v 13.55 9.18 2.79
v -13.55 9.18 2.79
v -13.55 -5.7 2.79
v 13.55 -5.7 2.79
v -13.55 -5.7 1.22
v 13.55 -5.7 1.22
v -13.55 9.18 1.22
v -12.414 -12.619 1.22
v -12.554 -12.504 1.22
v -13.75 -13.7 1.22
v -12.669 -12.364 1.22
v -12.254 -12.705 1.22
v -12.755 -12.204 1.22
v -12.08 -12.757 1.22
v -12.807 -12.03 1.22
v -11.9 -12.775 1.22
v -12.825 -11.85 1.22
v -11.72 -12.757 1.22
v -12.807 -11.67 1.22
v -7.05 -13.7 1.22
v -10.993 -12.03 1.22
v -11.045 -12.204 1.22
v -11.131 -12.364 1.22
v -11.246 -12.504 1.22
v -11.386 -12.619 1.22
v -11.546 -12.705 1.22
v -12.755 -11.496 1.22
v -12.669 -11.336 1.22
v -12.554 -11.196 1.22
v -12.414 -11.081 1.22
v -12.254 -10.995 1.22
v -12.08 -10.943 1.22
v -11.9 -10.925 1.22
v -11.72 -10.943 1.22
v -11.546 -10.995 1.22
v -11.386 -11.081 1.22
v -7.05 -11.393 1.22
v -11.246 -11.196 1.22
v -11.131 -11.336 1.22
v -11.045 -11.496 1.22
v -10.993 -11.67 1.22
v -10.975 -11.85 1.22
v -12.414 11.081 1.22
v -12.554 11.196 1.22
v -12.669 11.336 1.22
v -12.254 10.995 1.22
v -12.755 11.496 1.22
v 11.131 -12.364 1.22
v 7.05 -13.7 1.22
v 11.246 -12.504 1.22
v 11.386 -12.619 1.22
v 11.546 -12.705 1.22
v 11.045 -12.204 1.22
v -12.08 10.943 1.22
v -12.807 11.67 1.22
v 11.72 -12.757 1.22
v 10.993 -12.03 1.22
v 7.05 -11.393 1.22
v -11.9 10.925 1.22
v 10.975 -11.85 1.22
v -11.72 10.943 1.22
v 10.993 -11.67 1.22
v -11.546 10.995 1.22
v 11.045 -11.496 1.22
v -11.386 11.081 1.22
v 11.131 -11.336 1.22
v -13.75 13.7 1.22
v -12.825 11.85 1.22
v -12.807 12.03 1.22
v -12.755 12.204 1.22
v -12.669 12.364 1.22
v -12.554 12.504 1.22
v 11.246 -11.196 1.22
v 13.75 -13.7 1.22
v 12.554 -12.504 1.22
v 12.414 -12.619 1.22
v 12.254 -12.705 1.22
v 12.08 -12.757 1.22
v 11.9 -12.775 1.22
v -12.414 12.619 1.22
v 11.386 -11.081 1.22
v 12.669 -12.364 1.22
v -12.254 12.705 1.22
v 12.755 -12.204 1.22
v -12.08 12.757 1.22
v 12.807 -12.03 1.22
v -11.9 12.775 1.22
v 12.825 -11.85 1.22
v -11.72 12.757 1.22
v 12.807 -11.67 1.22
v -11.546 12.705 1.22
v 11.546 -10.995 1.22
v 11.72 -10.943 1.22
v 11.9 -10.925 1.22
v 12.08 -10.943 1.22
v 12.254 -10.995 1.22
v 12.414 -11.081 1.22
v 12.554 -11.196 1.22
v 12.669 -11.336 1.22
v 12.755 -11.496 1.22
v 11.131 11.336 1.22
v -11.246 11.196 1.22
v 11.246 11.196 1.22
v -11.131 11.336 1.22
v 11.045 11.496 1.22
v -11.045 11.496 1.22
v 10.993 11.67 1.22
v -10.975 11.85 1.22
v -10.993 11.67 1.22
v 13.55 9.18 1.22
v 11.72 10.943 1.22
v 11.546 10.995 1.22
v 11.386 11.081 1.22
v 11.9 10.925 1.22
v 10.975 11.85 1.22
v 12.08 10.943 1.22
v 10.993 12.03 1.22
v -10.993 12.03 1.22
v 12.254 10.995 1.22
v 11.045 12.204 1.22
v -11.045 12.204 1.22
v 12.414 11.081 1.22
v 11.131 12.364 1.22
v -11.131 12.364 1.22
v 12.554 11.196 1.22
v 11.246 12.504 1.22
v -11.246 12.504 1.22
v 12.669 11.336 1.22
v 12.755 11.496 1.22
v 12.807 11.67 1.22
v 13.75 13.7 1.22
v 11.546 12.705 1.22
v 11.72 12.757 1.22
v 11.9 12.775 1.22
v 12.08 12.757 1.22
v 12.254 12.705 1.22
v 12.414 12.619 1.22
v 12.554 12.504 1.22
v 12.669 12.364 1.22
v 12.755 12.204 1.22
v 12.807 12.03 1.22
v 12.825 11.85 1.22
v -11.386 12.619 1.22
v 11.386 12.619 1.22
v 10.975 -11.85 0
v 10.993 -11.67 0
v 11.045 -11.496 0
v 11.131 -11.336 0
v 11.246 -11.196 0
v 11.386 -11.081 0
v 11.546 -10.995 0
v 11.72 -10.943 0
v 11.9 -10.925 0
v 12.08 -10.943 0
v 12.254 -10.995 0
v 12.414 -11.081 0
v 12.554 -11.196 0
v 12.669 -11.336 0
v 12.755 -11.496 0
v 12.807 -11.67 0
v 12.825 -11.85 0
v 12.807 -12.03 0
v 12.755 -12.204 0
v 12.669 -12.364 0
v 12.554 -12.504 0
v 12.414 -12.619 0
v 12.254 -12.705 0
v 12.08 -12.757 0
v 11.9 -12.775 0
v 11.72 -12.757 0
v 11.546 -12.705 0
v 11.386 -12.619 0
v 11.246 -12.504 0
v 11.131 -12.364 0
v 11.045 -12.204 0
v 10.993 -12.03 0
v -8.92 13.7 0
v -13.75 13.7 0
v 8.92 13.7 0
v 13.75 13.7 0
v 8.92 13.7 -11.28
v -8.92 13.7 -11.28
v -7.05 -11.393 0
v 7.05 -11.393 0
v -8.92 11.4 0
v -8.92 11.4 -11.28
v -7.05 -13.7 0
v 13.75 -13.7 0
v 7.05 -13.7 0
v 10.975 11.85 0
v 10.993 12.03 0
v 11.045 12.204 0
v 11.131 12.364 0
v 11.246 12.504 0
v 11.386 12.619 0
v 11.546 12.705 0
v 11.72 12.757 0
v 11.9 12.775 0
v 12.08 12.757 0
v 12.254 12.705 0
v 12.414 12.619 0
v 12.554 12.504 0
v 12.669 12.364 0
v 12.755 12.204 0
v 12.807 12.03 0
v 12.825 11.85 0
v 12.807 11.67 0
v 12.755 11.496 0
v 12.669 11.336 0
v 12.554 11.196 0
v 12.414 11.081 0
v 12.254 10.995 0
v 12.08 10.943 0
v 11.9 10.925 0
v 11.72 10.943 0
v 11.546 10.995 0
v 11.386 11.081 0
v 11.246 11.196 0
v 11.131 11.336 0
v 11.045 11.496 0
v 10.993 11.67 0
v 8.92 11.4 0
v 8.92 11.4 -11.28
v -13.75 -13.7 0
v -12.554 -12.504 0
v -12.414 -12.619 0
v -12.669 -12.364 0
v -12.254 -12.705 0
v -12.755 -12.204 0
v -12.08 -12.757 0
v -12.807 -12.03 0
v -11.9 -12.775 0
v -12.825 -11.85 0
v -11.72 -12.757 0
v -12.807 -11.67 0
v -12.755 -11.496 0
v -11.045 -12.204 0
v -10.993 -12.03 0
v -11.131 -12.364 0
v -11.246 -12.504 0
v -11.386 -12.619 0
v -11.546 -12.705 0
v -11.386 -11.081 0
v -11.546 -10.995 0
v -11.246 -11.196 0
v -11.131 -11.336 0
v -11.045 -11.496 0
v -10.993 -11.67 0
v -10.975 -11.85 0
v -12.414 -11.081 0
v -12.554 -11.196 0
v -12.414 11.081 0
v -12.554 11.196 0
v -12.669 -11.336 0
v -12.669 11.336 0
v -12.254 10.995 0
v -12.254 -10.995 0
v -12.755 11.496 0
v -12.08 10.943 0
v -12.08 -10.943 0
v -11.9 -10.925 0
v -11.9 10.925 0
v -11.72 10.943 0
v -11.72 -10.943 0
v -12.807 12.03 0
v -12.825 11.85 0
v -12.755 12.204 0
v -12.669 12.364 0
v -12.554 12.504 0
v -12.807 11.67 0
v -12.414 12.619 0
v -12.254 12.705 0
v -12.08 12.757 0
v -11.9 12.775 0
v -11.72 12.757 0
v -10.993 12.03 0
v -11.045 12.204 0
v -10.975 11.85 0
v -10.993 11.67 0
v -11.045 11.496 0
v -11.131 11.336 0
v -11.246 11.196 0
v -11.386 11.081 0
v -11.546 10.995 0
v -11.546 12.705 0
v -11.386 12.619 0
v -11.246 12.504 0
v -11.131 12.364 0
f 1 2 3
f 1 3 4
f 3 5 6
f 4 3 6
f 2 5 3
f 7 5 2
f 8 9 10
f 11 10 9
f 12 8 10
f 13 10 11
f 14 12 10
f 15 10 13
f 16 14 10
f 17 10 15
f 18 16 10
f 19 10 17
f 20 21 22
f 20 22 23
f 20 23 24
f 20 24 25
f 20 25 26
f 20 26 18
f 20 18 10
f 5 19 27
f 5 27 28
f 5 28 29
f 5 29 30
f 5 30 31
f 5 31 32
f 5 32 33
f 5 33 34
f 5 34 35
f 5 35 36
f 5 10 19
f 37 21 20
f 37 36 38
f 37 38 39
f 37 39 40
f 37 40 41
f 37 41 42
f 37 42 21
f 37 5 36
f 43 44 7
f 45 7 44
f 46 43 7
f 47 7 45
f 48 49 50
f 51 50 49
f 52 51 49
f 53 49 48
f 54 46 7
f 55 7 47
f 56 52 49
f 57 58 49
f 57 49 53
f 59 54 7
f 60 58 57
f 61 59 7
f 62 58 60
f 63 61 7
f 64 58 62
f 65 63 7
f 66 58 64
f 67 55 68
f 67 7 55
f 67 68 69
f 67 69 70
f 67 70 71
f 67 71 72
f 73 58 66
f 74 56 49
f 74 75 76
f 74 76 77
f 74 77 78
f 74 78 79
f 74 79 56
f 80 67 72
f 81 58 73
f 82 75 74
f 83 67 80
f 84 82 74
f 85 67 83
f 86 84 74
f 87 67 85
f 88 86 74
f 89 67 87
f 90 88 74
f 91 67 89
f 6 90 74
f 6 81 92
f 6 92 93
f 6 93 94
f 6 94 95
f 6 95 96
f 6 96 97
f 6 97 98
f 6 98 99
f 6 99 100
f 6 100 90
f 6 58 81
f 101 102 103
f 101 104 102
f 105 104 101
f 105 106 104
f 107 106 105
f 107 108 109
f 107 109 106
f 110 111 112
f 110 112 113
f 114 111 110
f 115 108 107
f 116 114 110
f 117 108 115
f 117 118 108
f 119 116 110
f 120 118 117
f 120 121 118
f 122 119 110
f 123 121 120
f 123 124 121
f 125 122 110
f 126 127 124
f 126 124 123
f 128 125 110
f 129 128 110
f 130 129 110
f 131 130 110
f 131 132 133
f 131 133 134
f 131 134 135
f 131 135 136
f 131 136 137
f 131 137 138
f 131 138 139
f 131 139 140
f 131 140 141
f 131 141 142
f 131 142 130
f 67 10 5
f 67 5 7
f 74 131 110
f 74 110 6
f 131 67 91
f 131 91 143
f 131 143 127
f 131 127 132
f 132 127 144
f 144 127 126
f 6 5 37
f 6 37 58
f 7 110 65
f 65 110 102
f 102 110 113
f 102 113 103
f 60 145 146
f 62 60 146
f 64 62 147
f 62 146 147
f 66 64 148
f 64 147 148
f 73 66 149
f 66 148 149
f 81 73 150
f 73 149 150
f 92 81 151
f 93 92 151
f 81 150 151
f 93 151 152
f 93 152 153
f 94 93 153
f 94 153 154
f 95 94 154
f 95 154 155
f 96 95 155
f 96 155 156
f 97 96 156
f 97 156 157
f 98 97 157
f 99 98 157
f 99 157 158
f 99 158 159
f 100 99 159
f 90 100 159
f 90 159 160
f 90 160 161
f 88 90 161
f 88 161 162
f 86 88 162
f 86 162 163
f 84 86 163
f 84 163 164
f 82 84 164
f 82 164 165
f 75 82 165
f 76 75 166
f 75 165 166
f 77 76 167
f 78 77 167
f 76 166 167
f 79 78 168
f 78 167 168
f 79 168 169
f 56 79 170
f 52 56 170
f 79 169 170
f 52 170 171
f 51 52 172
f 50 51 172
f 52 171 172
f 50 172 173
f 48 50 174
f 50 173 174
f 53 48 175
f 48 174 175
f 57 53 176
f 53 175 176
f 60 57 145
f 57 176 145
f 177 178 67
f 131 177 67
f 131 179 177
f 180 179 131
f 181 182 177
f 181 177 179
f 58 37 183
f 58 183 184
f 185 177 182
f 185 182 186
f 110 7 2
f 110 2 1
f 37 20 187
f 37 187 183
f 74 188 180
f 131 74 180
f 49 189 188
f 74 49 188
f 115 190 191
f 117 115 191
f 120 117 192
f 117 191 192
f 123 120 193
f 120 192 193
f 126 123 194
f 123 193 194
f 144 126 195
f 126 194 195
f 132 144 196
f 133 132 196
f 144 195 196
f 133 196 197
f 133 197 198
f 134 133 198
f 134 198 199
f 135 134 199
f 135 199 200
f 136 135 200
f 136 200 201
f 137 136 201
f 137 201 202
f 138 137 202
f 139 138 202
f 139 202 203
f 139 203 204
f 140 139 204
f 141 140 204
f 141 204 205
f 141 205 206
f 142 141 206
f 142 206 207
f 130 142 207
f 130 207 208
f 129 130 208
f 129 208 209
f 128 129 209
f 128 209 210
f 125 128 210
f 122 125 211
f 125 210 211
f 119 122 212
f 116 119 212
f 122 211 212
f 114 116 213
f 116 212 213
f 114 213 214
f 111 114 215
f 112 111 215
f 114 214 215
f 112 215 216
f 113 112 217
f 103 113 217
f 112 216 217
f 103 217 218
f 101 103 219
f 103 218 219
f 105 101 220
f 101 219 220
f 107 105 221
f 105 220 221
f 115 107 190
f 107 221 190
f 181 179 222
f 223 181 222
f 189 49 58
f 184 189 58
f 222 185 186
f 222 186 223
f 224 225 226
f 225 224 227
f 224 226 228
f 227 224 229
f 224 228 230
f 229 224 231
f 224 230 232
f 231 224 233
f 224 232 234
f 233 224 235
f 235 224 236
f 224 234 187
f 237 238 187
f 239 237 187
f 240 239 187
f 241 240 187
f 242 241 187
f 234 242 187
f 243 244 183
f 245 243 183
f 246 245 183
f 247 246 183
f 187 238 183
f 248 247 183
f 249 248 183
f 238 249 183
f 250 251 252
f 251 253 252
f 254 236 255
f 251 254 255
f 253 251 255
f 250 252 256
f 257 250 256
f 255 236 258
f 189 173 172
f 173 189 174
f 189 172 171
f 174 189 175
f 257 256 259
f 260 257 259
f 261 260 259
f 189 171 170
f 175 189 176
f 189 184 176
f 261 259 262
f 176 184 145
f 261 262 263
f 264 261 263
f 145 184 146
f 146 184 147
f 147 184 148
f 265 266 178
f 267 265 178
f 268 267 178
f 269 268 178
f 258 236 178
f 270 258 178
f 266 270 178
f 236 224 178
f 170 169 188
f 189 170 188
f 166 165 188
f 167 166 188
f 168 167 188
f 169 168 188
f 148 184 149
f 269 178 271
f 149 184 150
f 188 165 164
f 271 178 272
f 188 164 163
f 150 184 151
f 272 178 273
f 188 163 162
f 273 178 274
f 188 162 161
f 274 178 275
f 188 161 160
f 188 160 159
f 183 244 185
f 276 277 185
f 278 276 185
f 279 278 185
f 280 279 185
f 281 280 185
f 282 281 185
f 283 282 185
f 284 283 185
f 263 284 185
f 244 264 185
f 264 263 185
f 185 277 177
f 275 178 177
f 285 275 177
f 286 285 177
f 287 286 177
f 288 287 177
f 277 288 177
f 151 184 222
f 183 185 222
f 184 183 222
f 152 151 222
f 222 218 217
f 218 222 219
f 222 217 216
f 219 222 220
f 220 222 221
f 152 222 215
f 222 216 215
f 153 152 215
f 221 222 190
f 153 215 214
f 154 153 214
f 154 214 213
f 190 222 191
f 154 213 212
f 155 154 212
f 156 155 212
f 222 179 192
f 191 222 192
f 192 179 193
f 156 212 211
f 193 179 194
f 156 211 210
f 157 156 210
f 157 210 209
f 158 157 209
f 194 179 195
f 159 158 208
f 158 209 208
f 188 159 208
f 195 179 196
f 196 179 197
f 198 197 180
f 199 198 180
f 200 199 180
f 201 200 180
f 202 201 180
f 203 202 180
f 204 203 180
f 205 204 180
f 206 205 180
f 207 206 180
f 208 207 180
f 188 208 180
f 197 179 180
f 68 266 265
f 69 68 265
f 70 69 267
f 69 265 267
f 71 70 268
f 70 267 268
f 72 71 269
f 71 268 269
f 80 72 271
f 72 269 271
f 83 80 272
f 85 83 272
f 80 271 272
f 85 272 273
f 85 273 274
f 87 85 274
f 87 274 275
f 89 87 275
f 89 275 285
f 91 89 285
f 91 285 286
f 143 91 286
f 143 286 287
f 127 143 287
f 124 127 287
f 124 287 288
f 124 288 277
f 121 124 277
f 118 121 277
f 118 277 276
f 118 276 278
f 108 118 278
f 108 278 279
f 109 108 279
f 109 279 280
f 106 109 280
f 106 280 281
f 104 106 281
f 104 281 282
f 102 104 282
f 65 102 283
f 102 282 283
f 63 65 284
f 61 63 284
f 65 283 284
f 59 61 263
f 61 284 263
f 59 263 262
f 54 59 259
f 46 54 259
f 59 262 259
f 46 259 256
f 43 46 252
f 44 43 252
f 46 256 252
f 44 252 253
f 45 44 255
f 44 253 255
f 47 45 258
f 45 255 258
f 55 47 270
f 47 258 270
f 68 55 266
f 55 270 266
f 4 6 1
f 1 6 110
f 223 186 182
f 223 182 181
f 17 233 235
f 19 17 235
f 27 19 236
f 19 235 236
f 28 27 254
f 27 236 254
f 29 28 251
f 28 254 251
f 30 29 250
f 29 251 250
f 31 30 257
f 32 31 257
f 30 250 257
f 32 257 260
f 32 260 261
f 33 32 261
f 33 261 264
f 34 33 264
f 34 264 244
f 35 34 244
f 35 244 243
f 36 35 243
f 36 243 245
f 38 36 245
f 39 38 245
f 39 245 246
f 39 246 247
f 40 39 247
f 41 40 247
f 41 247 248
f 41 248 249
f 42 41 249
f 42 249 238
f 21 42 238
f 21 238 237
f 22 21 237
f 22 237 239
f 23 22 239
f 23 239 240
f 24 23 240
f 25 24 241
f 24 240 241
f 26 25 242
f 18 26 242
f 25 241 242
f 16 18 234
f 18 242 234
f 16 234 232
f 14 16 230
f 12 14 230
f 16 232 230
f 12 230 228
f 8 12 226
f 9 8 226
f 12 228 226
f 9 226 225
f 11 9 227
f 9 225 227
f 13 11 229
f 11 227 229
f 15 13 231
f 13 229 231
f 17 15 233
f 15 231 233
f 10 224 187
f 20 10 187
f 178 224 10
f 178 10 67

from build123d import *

# Parameters (mm, degrees)
F0_W     = 27.5
F0_H     = 27.4
F1_DEPTH = 1.22
F2_W     = 14.1
F2_H     = 2.3066
F3_DEPTH = 25.4
F4_W     = 27.1
F4_H     = 14.88
F5_DEPTH = 1.57
F7_D     = 1.85
F8_W     = 17.84
F8_H     = 2.3
F9_DEPTH = 11.28


with BuildPart() as f1:
    # F0 (on Top) → F1 (new body)
    with BuildSketch(Plane.XY):
        Rectangle(F0_W, F0_H)
    extrude(amount=F1_DEPTH)

    # F2 (on face) → F3 (cut)
    with BuildSketch(Plane.XY.offset(1.22)):
        with Locations((0, -12.5467)):
            Rectangle(F2_W, F2_H)
    extrude(amount=-F3_DEPTH, mode=Mode.SUBTRACT)

    # F4 (on face) → F5 (join)
    with BuildSketch(Plane.XY.offset(1.22)):
        with Locations((0, 1.74)):
            Rectangle(F4_W, F4_H)
    extrude(amount=F5_DEPTH)

    # F7 (through all)
    with Locations(Plane.XY.offset(1.22)):
        with Locations((-11.9, -11.85), (-11.9, 11.85), (11.9, 11.85), (11.9, -11.85)):
            Hole(F7_D / 2)

    # F8 (on face) → F9 (join)
    with BuildSketch(Plane(origin=(0, 0, 0), x_dir=(1, 0, 0), z_dir=(0, 0, -1))):
        with Locations((0, -12.55)):
            Rectangle(F8_W, F8_H)
    extrude(amount=F9_DEPTH)


solid = f1.part
